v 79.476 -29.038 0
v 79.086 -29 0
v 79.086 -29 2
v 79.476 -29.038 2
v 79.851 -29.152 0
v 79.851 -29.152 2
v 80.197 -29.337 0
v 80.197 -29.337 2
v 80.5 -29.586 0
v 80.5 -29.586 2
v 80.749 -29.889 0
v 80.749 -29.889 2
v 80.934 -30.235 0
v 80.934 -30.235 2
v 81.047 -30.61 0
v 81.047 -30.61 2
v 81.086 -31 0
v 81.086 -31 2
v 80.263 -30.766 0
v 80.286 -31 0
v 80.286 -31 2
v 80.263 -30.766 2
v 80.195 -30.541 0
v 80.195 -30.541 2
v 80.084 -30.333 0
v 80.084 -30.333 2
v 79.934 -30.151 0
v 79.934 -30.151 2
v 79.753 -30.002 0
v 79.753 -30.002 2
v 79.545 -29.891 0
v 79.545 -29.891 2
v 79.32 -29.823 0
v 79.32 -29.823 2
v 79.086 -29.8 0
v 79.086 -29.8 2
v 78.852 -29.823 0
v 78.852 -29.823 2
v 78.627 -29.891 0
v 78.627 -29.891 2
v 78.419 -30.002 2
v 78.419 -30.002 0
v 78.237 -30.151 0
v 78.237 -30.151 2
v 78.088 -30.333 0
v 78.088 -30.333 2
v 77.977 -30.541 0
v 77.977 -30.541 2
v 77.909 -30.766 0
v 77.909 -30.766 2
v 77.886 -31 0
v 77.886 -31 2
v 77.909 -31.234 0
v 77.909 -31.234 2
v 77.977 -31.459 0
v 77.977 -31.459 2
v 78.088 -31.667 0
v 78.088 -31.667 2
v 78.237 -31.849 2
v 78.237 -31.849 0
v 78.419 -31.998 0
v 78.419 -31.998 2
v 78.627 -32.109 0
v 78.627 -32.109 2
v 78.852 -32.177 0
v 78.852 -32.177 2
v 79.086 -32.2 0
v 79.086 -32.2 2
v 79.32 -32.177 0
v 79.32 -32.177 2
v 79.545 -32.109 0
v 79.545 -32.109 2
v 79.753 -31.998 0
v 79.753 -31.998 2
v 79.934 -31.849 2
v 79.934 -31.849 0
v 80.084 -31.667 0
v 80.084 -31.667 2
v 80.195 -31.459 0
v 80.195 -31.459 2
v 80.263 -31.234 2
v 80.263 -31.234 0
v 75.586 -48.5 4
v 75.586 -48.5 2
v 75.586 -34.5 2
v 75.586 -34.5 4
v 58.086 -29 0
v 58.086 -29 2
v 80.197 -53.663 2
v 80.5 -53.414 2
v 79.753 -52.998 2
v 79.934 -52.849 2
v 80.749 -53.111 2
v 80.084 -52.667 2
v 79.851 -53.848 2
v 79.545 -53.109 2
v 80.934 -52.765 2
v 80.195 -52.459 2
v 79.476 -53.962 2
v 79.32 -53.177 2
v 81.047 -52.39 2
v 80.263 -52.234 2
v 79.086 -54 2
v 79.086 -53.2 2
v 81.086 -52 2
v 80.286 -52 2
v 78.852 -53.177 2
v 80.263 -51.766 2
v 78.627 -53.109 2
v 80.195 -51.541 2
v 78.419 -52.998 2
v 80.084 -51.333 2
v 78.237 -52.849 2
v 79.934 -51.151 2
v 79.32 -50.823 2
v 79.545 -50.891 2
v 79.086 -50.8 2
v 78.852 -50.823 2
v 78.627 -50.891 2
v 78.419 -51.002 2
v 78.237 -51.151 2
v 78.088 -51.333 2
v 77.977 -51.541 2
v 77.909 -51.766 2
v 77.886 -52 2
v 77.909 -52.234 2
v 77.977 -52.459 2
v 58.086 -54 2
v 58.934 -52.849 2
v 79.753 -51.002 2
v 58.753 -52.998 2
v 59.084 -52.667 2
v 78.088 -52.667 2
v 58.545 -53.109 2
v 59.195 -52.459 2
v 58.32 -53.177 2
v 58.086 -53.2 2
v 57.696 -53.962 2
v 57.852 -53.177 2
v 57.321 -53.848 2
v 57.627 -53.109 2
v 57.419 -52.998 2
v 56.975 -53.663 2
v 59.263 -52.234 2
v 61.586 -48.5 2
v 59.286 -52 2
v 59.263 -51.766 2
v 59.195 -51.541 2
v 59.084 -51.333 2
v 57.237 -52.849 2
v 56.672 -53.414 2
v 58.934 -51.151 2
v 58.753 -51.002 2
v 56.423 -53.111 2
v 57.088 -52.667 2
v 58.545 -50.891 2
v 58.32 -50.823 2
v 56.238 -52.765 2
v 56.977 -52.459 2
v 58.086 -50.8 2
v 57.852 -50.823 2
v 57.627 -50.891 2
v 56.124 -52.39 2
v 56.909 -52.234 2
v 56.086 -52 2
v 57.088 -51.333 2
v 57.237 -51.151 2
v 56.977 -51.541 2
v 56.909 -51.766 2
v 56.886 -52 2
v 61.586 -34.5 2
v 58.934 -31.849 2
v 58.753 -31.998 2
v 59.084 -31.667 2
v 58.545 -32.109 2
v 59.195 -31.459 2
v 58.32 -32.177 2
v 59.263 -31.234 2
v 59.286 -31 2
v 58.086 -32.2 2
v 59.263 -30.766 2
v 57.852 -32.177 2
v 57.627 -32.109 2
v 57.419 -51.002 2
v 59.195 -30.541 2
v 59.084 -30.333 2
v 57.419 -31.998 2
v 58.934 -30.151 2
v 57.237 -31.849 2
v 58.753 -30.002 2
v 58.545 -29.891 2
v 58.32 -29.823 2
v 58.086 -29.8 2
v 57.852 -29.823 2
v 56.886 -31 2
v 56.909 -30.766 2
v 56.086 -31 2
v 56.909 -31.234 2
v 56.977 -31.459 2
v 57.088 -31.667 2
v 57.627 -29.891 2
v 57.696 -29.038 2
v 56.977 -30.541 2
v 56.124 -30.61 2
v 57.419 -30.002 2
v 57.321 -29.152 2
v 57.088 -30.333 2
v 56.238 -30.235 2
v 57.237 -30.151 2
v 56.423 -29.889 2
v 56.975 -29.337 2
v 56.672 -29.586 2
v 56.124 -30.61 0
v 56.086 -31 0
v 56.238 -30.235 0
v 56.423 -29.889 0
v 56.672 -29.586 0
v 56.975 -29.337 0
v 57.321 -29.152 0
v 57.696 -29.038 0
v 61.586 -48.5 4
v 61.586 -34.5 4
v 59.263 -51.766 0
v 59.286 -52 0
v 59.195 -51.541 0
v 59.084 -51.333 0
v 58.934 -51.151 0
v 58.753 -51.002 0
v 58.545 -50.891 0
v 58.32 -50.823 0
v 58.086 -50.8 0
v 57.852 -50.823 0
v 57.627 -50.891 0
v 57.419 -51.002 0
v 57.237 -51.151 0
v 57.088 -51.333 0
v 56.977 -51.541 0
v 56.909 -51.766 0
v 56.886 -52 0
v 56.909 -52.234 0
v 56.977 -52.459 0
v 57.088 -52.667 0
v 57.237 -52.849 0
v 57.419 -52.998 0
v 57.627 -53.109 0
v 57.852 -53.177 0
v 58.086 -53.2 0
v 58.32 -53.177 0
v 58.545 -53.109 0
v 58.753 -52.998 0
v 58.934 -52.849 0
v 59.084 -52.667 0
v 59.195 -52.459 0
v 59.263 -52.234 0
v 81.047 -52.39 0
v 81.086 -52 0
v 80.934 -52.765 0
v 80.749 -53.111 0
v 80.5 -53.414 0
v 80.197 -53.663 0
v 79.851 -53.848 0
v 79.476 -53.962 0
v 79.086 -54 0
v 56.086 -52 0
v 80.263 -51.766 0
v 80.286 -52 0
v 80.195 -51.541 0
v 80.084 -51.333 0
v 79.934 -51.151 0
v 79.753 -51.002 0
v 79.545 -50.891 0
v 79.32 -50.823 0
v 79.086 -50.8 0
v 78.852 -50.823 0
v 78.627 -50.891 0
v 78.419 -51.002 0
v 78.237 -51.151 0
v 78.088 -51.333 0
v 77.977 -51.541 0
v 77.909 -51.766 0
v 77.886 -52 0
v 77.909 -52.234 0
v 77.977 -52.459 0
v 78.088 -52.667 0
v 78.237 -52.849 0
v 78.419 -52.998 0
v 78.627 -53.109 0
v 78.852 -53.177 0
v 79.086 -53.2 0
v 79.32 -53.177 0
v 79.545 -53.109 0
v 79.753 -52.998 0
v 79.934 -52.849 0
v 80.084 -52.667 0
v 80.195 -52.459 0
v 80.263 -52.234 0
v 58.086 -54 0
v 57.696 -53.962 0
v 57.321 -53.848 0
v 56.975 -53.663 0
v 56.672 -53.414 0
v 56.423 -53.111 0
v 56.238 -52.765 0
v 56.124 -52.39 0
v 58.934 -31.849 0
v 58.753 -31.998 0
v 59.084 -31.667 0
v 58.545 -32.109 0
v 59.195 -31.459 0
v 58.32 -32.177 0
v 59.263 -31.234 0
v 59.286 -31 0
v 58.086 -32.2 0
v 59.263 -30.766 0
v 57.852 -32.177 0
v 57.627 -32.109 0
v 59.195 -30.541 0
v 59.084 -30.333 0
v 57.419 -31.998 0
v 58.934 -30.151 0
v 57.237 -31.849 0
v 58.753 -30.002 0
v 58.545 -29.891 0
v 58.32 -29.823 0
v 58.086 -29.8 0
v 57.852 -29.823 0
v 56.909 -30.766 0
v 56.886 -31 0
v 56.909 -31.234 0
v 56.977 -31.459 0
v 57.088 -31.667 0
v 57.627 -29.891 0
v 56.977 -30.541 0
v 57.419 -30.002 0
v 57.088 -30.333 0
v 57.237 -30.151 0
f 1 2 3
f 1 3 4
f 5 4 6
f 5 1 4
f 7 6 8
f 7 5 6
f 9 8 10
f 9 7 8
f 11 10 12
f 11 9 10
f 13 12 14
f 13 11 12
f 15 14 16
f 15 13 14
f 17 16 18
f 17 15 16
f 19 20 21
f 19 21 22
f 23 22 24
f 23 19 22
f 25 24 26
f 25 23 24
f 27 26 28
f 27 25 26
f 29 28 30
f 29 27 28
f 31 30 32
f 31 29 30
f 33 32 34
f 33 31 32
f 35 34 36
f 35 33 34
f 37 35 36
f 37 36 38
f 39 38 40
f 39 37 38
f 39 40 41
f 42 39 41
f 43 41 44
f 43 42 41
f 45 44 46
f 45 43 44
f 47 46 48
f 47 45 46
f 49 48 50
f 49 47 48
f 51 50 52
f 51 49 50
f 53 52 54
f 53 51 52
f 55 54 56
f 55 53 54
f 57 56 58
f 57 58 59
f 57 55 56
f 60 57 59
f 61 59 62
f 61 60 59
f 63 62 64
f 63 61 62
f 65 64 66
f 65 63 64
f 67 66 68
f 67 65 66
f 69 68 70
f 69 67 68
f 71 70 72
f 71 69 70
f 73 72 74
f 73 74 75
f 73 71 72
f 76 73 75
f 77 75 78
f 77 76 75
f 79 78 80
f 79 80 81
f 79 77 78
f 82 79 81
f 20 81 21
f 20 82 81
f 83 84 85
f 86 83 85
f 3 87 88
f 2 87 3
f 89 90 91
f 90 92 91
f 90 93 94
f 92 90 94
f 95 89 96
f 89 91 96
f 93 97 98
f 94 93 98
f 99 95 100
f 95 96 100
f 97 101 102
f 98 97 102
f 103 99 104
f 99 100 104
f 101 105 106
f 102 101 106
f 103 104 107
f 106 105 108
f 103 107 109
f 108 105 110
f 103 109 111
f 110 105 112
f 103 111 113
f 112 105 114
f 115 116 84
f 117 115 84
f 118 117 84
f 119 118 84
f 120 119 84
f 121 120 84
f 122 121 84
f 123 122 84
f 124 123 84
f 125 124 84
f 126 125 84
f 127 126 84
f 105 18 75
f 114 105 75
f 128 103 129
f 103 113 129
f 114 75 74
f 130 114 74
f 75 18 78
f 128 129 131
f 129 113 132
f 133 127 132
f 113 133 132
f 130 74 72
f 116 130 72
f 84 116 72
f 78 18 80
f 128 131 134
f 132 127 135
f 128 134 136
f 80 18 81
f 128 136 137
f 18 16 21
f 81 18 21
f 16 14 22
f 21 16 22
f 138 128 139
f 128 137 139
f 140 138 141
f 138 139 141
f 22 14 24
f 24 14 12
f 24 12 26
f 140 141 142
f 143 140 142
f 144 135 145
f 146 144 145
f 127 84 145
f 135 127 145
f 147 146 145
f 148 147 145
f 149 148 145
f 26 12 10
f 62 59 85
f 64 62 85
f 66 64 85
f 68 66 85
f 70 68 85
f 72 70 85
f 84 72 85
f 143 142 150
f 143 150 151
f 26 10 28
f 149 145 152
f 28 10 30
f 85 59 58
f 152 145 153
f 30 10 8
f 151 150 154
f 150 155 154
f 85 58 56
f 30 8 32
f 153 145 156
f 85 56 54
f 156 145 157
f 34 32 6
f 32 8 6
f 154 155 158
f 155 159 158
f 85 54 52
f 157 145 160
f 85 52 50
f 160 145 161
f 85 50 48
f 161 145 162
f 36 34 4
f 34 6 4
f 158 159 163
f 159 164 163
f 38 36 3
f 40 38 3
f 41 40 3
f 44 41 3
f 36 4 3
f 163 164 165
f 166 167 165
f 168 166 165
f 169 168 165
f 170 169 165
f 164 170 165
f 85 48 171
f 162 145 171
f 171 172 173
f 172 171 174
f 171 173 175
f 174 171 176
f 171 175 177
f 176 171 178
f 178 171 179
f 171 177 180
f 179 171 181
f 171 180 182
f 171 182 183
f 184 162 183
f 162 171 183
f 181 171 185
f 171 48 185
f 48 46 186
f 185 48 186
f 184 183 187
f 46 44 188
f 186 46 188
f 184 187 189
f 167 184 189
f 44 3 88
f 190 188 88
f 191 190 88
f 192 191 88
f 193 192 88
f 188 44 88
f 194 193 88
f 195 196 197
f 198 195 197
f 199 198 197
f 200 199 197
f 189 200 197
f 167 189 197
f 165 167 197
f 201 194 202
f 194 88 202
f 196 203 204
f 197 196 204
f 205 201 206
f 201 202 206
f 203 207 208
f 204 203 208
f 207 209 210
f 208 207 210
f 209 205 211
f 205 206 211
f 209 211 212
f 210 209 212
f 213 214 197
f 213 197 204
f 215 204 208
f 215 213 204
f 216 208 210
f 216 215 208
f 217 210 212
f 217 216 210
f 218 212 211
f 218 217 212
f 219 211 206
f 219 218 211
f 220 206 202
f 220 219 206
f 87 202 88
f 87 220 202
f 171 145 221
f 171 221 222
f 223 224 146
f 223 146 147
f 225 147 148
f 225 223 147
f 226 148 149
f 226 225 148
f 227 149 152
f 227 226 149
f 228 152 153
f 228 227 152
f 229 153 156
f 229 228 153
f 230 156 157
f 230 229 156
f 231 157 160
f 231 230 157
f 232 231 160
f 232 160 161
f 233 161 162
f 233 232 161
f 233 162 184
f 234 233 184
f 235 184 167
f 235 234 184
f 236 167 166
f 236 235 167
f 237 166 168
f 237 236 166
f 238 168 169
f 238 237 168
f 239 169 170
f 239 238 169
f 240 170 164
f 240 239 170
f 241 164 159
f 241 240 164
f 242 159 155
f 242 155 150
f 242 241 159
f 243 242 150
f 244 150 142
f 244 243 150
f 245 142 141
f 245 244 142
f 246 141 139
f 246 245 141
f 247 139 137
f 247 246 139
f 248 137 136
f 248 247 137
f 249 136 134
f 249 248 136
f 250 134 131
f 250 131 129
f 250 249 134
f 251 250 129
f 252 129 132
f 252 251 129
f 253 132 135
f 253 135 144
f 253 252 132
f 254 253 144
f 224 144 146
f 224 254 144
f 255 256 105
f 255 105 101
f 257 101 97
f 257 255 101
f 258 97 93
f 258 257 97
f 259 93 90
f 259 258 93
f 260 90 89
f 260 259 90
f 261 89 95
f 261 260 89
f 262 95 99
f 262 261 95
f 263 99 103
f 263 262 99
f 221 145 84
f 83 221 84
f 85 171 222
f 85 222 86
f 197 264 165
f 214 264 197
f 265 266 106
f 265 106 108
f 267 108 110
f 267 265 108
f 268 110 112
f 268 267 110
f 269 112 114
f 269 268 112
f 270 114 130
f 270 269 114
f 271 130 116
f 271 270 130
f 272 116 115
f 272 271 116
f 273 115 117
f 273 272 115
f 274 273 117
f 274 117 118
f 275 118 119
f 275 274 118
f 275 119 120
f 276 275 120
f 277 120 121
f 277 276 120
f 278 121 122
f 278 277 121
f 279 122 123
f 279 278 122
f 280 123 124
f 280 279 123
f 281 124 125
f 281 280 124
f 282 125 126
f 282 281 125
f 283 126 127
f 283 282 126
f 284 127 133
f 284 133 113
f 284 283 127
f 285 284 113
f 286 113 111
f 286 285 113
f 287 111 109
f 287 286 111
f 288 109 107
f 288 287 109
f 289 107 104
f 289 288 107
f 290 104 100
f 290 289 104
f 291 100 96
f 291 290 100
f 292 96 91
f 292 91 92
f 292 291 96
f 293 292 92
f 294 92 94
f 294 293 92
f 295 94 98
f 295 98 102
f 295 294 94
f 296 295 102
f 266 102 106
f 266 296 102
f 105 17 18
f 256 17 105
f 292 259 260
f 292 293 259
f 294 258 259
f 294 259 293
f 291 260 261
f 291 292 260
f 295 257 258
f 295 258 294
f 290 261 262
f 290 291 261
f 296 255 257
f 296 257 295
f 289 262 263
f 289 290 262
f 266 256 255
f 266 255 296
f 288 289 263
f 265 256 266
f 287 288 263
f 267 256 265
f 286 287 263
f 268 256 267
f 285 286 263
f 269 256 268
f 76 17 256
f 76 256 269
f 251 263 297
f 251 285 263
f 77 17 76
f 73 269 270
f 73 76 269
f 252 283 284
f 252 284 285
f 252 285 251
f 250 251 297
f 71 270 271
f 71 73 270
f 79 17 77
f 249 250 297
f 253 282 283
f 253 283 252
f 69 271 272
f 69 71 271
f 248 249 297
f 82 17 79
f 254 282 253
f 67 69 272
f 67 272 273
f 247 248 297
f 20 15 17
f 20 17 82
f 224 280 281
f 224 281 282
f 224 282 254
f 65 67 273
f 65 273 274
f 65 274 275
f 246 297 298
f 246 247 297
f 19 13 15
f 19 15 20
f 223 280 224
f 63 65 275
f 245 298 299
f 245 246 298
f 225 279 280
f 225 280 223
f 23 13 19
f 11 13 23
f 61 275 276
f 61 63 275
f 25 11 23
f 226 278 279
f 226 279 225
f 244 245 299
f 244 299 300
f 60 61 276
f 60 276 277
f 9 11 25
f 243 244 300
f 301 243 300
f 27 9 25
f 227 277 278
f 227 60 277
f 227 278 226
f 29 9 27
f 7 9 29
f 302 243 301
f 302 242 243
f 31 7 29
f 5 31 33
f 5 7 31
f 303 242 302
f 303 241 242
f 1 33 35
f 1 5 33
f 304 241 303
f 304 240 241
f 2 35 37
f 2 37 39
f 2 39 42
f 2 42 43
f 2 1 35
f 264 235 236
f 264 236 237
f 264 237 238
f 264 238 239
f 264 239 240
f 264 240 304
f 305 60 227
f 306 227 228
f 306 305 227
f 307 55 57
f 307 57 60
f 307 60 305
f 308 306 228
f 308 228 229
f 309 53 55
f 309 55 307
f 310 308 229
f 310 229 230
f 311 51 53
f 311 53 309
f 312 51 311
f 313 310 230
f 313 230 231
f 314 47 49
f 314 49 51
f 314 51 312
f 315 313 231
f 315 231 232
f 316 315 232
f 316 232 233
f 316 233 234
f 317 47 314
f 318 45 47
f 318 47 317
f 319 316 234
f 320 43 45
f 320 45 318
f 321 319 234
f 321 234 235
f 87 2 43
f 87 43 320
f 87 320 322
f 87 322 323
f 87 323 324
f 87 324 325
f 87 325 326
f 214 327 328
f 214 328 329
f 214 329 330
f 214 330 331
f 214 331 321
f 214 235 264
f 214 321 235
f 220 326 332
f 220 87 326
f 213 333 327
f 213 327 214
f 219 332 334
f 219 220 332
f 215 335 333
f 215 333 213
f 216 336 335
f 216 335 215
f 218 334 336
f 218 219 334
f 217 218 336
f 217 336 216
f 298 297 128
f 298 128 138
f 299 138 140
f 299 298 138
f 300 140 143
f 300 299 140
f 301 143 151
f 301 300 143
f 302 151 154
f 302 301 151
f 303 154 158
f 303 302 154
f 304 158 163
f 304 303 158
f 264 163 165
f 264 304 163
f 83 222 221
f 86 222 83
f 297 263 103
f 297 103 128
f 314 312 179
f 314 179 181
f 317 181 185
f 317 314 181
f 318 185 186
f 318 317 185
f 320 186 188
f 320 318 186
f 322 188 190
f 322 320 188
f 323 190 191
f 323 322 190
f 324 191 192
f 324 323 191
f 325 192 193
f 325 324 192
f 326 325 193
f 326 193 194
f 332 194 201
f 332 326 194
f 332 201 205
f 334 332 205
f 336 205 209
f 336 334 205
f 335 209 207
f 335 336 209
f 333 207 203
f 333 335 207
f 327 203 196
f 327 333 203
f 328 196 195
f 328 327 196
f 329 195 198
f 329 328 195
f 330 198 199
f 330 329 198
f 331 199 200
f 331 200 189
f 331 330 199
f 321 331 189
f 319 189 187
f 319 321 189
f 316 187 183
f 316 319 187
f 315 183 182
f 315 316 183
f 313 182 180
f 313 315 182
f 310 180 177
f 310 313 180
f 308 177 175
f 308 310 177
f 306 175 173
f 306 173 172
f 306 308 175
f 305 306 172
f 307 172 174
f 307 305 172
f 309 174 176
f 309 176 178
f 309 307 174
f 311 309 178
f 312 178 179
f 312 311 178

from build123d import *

# Parameters (mm, degrees)
SKETCH1_R           = 1.2
BOSS_EXTRUDE1_DEPTH = 2
SKETCH2_W           = 14
SKETCH2_H           = 14
BOSS_EXTRUDE2_DEPTH = 2


with BuildPart() as part:
    # Sketch1 → Boss-Extrude1 (new body)
    with BuildSketch(Plane.XY):
        with BuildLine():
            Line((58.085871194, -29), (79.085871194, -29))
            ThreePointArc((79.085871194, -29), (80.500084756, -29.585786438), (81.085871194, -31))
            Line((81.085871194, -31), (81.085871194, -52))
            ThreePointArc((81.085871194, -52), (80.500084756, -53.414213562), (79.085871194, -54))
            Line((79.085871194, -54), (58.085871194, -54))
            ThreePointArc((58.085871194, -54), (56.671657631, -53.414213562), (56.085871194, -52))
            Line((56.085871194, -52), (56.085871194, -31))
            ThreePointArc((56.085871194, -31), (56.671657631, -29.585786438), (58.085871194, -29))
        make_face()
        with Locations((58.085871194, -52)):
            Circle(SKETCH1_R, mode=Mode.SUBTRACT)
        with Locations((79.085871194, -52)):
            Circle(SKETCH1_R, mode=Mode.SUBTRACT)
        with Locations((79.085871194, -31)):
            Circle(SKETCH1_R, mode=Mode.SUBTRACT)
        with Locations((58.085871194, -31)):
            Circle(SKETCH1_R, mode=Mode.SUBTRACT)
    extrude(amount=BOSS_EXTRUDE1_DEPTH)

    # Sketch2 → Boss-Extrude2 (add)
    with BuildSketch(Plane.XY.offset(2)):
        with Locations((68.585871194, -41.5)):
            Rectangle(SKETCH2_W, SKETCH2_H)
    extrude(amount=BOSS_EXTRUDE2_DEPTH)


solid = part.part
